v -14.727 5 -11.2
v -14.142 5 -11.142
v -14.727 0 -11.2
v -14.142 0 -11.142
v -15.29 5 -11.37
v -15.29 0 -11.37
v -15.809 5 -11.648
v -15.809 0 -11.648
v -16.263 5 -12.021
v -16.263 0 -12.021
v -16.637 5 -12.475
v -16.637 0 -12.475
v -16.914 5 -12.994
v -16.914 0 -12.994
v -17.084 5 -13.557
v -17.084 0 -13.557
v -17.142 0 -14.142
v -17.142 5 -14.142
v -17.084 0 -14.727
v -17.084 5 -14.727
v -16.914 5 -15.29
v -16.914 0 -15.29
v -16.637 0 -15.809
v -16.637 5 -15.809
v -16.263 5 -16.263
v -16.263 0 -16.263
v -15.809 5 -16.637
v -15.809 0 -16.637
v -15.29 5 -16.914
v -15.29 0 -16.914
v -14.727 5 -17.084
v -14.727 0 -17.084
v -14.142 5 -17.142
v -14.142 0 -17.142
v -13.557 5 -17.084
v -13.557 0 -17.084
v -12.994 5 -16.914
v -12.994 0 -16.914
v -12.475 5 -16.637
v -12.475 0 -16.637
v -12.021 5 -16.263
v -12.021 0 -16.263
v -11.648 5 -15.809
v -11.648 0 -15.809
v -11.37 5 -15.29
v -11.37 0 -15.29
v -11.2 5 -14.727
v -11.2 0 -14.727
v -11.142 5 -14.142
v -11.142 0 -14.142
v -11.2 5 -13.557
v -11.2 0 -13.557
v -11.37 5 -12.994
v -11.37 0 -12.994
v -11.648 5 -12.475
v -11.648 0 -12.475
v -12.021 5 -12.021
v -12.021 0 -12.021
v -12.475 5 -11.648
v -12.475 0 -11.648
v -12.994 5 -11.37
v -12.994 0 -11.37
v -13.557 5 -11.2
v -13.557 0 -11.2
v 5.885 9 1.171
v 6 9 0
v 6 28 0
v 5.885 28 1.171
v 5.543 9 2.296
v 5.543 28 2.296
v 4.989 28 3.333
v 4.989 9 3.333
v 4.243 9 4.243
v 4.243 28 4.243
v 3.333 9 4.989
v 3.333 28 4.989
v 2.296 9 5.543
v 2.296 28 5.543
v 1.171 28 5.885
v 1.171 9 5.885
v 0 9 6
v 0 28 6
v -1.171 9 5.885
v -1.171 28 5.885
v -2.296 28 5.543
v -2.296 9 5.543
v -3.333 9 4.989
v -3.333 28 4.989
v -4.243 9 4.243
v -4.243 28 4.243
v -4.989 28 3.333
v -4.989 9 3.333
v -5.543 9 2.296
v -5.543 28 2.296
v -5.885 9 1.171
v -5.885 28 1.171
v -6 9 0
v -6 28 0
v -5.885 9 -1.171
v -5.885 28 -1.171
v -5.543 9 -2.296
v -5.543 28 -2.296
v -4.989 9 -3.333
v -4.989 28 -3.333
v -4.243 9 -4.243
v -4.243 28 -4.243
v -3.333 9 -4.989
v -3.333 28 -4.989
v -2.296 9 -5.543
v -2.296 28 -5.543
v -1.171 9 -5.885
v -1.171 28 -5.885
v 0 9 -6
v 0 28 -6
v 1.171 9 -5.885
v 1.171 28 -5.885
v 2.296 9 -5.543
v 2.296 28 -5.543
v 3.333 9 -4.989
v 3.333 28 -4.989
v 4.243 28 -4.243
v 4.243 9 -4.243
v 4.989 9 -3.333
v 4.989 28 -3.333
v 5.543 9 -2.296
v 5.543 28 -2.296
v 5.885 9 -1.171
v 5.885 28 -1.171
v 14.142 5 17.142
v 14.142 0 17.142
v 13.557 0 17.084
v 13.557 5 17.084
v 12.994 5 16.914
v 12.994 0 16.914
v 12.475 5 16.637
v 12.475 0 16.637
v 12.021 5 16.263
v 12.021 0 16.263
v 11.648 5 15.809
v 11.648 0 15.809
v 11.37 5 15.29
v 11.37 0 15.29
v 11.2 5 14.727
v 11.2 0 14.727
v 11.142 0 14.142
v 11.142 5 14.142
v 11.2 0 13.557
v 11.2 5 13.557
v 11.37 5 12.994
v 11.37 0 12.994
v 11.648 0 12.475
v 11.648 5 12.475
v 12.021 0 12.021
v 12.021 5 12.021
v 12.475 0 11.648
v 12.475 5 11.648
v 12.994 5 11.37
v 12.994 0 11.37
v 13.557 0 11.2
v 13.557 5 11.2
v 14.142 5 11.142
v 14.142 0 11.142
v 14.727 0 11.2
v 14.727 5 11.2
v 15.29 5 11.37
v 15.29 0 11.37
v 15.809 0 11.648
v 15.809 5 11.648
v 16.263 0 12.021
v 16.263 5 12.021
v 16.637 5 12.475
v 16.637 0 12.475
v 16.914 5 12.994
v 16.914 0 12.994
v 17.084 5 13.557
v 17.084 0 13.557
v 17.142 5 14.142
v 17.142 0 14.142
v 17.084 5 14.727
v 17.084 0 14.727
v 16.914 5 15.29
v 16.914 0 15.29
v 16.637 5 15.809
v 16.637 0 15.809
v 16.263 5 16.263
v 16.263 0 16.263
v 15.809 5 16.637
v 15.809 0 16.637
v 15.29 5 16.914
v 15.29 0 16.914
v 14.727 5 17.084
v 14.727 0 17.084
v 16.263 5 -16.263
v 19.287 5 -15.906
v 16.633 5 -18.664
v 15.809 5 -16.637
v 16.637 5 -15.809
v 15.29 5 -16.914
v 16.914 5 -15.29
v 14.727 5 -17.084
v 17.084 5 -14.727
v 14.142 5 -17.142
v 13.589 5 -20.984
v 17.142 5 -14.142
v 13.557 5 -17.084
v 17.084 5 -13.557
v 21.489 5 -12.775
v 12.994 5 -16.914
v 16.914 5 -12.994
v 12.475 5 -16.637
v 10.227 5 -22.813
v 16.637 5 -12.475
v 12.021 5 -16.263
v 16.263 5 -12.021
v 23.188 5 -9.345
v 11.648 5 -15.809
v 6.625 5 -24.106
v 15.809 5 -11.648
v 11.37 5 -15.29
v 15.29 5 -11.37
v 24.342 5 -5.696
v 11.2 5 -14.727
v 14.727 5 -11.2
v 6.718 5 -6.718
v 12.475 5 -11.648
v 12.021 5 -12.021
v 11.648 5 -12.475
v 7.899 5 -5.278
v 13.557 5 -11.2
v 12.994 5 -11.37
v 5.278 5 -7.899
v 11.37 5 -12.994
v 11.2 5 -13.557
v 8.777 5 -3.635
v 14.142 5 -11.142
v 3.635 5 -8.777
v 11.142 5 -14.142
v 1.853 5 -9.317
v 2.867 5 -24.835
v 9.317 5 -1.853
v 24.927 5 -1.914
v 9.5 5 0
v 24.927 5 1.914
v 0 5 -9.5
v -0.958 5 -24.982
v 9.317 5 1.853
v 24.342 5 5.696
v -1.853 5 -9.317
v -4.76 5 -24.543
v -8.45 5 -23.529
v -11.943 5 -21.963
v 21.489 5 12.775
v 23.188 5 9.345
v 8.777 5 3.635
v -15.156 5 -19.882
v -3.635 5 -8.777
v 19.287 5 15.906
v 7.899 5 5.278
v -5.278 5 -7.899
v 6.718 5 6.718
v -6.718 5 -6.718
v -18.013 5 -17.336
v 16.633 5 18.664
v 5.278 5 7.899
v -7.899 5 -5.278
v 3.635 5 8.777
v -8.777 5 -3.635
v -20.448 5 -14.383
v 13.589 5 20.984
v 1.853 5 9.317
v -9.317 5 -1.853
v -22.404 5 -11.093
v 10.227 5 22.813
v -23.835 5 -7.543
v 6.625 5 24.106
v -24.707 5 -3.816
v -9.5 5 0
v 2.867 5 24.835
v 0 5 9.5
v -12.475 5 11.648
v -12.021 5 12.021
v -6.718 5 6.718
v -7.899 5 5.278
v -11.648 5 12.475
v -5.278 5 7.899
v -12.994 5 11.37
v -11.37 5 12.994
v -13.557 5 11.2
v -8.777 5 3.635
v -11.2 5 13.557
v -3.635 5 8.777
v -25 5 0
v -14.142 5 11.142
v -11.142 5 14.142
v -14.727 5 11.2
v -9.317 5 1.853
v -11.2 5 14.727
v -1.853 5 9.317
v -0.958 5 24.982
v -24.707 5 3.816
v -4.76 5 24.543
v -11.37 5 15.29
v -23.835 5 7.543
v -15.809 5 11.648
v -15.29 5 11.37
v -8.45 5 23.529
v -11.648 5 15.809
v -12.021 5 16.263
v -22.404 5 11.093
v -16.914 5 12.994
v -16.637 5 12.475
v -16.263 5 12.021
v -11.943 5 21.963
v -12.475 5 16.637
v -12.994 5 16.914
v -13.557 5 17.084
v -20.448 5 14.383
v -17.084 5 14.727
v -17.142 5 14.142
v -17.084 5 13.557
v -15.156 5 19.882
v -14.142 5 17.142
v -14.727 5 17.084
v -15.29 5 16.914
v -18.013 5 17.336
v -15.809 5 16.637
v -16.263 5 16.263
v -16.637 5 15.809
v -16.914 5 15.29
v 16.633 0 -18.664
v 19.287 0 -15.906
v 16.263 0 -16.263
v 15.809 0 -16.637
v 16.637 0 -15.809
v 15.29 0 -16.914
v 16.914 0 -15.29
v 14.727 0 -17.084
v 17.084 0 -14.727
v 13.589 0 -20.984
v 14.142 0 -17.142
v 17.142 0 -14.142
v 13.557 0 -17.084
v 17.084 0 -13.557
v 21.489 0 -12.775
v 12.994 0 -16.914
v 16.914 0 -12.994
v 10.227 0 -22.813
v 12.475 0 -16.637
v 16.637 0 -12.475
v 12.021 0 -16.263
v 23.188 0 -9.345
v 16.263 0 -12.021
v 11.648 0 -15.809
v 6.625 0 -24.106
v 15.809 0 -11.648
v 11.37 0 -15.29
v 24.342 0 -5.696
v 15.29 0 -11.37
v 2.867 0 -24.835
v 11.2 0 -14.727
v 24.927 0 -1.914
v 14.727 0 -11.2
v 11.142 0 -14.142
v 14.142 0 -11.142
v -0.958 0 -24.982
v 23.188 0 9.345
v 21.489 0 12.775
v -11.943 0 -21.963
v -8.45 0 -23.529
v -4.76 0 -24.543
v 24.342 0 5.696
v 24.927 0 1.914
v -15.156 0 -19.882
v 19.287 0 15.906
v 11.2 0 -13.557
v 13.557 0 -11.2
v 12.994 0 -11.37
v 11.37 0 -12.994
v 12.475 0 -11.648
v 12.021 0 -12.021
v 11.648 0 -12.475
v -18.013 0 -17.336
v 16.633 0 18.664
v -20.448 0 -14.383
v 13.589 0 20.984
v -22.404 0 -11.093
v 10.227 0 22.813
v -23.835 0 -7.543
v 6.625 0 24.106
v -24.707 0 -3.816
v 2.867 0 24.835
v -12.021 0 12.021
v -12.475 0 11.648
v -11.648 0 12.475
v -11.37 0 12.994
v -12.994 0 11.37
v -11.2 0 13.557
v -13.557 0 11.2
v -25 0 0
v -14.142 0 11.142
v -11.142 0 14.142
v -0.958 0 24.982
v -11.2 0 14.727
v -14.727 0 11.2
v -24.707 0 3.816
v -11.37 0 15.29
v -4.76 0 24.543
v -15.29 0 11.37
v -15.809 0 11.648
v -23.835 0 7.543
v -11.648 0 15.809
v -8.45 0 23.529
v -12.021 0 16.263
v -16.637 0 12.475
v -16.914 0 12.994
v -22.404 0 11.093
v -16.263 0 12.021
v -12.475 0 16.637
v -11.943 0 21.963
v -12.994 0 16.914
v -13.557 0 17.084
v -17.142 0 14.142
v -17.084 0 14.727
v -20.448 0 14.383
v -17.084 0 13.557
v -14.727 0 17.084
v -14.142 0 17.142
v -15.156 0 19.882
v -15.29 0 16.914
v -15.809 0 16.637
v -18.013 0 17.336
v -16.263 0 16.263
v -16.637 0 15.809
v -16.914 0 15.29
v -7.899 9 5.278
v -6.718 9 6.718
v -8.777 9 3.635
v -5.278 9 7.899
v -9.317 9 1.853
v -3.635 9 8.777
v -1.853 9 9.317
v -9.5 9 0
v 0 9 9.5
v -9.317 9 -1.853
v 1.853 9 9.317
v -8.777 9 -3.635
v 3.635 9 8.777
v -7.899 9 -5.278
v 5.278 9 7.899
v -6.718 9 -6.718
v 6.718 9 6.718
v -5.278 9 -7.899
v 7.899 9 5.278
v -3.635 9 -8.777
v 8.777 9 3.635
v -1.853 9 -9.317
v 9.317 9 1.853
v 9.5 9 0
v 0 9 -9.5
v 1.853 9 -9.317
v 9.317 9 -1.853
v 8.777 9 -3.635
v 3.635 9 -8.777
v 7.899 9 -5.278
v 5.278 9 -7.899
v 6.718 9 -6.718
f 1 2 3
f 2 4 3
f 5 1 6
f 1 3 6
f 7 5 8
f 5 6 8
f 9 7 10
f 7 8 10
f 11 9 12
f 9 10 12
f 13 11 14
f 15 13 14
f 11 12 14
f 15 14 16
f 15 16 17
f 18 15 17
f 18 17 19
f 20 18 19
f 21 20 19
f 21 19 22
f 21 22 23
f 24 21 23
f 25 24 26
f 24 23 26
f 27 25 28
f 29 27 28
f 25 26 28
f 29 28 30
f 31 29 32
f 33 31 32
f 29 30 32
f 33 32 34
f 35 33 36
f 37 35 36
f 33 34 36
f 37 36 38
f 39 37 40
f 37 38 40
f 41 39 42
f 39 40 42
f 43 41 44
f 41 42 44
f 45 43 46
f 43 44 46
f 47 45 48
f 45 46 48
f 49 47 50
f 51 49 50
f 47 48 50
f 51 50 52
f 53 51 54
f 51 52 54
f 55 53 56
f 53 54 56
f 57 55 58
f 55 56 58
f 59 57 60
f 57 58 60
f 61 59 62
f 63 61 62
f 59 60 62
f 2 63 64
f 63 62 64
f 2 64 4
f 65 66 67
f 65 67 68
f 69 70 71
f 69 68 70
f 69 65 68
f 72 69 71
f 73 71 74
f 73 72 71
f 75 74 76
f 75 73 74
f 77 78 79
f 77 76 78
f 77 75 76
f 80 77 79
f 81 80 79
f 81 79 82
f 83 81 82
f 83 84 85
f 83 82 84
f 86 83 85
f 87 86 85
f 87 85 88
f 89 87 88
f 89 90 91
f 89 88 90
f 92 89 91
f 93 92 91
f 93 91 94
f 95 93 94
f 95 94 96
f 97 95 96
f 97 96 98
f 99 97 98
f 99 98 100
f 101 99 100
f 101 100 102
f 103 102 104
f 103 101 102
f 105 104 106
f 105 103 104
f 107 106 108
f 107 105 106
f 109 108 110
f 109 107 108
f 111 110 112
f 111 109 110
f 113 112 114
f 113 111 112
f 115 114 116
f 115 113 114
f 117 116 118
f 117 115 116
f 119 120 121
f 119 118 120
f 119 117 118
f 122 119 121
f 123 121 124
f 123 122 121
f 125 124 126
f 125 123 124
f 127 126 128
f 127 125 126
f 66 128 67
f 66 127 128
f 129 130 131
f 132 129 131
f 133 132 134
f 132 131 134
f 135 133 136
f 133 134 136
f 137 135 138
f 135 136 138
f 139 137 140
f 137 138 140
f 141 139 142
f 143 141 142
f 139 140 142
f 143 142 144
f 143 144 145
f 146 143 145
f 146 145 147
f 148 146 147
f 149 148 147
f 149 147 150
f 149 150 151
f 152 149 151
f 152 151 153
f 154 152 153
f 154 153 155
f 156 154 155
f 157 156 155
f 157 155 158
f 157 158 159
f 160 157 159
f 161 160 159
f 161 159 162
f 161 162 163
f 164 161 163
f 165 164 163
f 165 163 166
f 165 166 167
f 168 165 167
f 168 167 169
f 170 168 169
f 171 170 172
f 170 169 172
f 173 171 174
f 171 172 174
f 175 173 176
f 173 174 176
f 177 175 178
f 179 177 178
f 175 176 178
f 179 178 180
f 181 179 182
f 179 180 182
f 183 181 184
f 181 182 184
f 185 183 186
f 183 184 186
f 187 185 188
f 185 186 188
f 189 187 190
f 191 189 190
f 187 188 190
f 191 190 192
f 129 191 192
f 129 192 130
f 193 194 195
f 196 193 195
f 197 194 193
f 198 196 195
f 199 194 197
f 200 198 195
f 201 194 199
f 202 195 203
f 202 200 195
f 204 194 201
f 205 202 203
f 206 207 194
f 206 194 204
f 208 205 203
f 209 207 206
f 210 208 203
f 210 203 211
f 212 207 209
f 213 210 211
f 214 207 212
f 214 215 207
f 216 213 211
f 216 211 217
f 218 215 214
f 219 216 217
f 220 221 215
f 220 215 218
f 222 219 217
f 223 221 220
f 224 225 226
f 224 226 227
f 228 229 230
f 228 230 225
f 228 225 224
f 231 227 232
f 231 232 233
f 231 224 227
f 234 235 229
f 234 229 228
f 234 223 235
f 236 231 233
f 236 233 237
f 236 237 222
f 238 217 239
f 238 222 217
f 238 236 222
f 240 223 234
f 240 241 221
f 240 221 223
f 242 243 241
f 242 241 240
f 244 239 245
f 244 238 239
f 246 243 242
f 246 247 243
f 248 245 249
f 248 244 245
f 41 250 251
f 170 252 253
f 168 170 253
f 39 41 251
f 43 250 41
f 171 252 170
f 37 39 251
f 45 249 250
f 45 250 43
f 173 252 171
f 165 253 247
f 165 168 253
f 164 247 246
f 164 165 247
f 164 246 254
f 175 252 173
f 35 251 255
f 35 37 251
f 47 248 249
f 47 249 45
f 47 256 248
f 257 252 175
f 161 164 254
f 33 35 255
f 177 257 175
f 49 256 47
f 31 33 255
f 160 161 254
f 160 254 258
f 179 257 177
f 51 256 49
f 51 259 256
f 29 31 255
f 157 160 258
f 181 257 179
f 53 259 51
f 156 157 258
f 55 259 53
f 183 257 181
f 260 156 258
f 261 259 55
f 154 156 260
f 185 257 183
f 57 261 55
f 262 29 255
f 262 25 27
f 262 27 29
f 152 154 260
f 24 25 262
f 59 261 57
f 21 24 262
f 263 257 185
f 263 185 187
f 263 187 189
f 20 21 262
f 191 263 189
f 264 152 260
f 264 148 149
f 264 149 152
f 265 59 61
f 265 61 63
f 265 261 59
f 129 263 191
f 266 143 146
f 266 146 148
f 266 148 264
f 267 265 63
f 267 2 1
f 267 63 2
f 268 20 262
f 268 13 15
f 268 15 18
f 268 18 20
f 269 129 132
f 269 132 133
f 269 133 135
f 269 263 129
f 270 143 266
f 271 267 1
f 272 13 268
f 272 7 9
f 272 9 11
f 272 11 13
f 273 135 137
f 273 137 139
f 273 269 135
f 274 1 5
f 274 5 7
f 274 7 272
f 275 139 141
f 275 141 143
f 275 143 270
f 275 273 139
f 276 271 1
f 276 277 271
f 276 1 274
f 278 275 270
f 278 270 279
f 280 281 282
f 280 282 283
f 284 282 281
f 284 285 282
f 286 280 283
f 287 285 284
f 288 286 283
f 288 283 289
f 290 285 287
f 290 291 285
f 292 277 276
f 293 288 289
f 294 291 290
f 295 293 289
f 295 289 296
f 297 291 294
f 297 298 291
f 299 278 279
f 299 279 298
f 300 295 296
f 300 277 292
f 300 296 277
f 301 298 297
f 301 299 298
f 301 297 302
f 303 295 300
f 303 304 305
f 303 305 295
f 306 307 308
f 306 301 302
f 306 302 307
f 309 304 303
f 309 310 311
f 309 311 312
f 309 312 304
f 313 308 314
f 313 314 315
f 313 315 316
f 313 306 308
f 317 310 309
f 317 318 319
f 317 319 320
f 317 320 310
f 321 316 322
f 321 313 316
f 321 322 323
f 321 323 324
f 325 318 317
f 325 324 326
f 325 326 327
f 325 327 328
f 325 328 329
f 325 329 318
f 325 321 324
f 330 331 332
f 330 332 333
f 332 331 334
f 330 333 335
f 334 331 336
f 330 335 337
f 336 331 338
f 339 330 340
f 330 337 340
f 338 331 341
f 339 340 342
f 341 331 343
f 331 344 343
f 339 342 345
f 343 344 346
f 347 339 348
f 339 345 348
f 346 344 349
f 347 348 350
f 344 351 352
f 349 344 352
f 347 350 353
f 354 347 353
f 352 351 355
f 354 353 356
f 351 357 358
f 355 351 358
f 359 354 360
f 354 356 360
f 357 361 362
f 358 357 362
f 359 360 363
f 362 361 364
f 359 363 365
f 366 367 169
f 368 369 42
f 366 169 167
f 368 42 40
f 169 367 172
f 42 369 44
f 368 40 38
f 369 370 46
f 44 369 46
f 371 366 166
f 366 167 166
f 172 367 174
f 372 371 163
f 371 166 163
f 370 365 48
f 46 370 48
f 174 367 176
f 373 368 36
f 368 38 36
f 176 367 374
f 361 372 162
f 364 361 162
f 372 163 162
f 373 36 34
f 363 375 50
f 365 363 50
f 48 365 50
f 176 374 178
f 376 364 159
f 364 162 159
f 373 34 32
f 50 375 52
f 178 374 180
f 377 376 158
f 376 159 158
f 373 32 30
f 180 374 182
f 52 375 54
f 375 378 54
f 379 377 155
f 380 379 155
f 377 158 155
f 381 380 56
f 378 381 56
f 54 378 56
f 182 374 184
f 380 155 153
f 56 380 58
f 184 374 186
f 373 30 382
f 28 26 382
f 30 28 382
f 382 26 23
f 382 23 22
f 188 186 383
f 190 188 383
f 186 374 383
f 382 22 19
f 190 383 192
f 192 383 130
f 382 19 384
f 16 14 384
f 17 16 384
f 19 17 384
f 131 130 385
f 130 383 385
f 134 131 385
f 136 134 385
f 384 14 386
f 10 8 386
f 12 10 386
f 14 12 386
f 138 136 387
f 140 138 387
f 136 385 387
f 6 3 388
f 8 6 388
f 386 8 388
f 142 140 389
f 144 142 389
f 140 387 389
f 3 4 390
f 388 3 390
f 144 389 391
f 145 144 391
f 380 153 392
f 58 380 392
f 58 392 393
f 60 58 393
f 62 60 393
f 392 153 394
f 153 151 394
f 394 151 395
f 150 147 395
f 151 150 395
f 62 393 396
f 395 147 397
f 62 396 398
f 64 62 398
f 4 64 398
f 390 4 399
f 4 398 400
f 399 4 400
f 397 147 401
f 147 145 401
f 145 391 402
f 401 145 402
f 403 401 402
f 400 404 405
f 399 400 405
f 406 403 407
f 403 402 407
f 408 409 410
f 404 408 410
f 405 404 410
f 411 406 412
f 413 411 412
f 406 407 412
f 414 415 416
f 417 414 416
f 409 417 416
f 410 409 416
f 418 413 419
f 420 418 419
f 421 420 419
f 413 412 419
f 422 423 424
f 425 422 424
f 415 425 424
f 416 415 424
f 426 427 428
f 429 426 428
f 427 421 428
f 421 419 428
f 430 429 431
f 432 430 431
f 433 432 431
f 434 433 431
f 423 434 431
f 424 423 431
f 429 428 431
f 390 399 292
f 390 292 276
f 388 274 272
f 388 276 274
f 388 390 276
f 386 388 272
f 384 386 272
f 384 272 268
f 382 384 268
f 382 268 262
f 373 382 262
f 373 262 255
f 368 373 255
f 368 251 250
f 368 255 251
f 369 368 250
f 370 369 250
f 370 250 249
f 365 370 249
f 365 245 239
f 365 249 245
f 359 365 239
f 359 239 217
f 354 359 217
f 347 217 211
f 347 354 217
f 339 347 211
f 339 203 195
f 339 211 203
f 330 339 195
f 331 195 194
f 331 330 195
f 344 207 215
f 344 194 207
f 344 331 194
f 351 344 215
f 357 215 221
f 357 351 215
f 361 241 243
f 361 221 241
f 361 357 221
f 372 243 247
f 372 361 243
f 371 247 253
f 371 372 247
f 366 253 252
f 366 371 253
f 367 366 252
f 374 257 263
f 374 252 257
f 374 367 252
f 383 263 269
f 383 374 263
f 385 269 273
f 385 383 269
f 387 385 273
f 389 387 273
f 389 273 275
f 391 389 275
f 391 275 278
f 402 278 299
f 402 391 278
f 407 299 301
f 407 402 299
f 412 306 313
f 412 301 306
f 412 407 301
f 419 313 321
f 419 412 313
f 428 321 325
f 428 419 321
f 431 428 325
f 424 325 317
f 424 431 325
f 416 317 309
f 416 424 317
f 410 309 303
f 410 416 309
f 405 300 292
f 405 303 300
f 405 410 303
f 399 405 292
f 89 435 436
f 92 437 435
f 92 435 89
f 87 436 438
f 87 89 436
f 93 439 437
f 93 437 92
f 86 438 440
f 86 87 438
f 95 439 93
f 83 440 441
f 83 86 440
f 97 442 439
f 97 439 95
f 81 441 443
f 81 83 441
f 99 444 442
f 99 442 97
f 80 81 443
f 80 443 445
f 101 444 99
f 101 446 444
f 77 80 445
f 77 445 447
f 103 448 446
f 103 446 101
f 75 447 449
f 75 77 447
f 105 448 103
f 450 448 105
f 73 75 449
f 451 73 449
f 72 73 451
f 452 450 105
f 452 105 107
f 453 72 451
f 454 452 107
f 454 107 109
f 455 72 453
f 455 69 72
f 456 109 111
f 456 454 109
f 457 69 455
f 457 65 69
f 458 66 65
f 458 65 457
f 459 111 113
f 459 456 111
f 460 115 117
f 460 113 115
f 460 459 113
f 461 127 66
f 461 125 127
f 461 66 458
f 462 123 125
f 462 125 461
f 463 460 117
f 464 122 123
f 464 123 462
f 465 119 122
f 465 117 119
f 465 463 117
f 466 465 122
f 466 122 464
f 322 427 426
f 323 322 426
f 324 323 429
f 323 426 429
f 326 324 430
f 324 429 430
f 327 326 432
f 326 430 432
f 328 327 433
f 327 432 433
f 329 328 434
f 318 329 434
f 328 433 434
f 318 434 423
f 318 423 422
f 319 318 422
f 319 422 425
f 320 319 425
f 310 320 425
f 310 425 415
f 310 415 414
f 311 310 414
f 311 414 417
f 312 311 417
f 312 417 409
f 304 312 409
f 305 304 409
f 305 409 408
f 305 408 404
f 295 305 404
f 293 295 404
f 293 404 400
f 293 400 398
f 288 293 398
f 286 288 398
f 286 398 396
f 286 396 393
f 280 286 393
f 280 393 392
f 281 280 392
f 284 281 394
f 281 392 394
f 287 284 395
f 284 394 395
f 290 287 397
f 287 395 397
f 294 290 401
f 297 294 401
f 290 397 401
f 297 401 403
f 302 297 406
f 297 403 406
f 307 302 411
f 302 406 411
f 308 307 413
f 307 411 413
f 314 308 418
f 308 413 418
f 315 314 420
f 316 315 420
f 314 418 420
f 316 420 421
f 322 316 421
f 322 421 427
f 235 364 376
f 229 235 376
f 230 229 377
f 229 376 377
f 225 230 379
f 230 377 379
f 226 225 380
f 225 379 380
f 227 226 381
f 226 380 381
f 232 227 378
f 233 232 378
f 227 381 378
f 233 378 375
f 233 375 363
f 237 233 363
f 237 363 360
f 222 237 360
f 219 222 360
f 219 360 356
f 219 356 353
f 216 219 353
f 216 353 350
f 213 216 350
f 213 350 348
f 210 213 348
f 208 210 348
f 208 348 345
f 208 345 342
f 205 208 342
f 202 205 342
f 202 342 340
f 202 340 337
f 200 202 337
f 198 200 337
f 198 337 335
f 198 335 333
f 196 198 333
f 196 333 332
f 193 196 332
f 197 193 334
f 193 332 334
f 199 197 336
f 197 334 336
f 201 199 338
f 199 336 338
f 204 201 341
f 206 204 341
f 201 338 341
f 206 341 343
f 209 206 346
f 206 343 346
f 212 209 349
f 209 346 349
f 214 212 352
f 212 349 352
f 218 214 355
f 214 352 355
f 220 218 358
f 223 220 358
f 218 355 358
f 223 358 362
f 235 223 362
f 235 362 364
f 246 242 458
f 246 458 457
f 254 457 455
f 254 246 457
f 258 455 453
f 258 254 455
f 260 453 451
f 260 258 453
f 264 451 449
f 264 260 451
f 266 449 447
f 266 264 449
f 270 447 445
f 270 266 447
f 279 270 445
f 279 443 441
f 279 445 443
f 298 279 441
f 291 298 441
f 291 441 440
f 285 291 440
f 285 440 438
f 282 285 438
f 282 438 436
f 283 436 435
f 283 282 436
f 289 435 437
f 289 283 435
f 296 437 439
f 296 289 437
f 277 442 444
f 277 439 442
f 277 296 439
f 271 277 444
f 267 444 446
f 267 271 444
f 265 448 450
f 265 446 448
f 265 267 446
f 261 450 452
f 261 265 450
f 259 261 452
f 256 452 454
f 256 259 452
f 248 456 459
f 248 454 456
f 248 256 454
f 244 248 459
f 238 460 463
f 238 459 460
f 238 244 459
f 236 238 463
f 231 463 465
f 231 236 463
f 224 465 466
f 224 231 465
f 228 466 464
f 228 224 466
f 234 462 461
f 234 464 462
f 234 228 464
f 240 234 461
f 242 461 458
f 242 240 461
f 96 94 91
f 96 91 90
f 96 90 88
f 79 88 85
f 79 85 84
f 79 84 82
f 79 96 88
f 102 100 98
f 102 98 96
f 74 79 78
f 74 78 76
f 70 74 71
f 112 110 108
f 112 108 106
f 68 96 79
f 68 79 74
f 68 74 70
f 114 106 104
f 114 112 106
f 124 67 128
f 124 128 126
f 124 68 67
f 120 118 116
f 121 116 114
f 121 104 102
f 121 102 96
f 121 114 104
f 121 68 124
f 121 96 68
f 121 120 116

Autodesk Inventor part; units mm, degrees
ref_plane "YZ Plane" through (0, 0, 0) normal (1, 0, 0) x (0, 1, 0)
ref_plane "XZ Plane" through (0, 0, 0) normal (0, 1, 0) x (-1, 0, 0)
ref_plane "XY Plane" through (0, 0, 0) normal (0, 0, 1) x (1, 0, 0)
sketch "Sketch1" plane through (0, 0, 0) normal (0, 1, 0) x (-1, 0, 0)
  circle A0 centre (0, 0) radius 25
  dimension "d0" = 50
extrude "Extrusion1" add sketch "Sketch1" along normal blind 5
sketch "Sketch2" plane through (0, 5, 0) normal (0, 1, 0) x (1, 0, 0)
  line L0 (0, 0) -> (-14.1421, -14.1421) construction
  line L1 (0, 0) -> (20, 0) construction
  point P0 (14.1421, -14.1421)
  point P1 (14.1421, 14.1421)
  point P2 (-14.1421, 14.1421)
  dimension "d3" = 20
  dimension "d4" = 135
  dimension "d7" = 360
hole "Hole1" at (-14.1421, 5, 14.1421) at (14.1421, 5, 14.1421) at (14.1421, 5, -14.1421) at (-14.1421, 5, -14.1421) direction (0, -1, 0) diameter 6 end through all
sketch "Sketch3" plane through (0, 5, 0) normal (0, 1, 0) x (1, 0, 0)
  circle A0 centre (0, 0) radius 9.5
  dimension "d16" = 19
extrude "Extrusion2" add sketch "Sketch3" along normal blind 4
sketch "Sketch4" plane through (0, 9, 0) normal (0, 1, 0) x (1, 0, 0)
  circle A0 centre (0, 0) radius 6
  dimension "d19" = 12
extrude "Extrusion3" add sketch "Sketch4" along normal blind 19
thread "Thread1" size "M12x1.75" class "6g" standard "ANSI Metric M Profile" full length
properties part number "PortaMandril"
